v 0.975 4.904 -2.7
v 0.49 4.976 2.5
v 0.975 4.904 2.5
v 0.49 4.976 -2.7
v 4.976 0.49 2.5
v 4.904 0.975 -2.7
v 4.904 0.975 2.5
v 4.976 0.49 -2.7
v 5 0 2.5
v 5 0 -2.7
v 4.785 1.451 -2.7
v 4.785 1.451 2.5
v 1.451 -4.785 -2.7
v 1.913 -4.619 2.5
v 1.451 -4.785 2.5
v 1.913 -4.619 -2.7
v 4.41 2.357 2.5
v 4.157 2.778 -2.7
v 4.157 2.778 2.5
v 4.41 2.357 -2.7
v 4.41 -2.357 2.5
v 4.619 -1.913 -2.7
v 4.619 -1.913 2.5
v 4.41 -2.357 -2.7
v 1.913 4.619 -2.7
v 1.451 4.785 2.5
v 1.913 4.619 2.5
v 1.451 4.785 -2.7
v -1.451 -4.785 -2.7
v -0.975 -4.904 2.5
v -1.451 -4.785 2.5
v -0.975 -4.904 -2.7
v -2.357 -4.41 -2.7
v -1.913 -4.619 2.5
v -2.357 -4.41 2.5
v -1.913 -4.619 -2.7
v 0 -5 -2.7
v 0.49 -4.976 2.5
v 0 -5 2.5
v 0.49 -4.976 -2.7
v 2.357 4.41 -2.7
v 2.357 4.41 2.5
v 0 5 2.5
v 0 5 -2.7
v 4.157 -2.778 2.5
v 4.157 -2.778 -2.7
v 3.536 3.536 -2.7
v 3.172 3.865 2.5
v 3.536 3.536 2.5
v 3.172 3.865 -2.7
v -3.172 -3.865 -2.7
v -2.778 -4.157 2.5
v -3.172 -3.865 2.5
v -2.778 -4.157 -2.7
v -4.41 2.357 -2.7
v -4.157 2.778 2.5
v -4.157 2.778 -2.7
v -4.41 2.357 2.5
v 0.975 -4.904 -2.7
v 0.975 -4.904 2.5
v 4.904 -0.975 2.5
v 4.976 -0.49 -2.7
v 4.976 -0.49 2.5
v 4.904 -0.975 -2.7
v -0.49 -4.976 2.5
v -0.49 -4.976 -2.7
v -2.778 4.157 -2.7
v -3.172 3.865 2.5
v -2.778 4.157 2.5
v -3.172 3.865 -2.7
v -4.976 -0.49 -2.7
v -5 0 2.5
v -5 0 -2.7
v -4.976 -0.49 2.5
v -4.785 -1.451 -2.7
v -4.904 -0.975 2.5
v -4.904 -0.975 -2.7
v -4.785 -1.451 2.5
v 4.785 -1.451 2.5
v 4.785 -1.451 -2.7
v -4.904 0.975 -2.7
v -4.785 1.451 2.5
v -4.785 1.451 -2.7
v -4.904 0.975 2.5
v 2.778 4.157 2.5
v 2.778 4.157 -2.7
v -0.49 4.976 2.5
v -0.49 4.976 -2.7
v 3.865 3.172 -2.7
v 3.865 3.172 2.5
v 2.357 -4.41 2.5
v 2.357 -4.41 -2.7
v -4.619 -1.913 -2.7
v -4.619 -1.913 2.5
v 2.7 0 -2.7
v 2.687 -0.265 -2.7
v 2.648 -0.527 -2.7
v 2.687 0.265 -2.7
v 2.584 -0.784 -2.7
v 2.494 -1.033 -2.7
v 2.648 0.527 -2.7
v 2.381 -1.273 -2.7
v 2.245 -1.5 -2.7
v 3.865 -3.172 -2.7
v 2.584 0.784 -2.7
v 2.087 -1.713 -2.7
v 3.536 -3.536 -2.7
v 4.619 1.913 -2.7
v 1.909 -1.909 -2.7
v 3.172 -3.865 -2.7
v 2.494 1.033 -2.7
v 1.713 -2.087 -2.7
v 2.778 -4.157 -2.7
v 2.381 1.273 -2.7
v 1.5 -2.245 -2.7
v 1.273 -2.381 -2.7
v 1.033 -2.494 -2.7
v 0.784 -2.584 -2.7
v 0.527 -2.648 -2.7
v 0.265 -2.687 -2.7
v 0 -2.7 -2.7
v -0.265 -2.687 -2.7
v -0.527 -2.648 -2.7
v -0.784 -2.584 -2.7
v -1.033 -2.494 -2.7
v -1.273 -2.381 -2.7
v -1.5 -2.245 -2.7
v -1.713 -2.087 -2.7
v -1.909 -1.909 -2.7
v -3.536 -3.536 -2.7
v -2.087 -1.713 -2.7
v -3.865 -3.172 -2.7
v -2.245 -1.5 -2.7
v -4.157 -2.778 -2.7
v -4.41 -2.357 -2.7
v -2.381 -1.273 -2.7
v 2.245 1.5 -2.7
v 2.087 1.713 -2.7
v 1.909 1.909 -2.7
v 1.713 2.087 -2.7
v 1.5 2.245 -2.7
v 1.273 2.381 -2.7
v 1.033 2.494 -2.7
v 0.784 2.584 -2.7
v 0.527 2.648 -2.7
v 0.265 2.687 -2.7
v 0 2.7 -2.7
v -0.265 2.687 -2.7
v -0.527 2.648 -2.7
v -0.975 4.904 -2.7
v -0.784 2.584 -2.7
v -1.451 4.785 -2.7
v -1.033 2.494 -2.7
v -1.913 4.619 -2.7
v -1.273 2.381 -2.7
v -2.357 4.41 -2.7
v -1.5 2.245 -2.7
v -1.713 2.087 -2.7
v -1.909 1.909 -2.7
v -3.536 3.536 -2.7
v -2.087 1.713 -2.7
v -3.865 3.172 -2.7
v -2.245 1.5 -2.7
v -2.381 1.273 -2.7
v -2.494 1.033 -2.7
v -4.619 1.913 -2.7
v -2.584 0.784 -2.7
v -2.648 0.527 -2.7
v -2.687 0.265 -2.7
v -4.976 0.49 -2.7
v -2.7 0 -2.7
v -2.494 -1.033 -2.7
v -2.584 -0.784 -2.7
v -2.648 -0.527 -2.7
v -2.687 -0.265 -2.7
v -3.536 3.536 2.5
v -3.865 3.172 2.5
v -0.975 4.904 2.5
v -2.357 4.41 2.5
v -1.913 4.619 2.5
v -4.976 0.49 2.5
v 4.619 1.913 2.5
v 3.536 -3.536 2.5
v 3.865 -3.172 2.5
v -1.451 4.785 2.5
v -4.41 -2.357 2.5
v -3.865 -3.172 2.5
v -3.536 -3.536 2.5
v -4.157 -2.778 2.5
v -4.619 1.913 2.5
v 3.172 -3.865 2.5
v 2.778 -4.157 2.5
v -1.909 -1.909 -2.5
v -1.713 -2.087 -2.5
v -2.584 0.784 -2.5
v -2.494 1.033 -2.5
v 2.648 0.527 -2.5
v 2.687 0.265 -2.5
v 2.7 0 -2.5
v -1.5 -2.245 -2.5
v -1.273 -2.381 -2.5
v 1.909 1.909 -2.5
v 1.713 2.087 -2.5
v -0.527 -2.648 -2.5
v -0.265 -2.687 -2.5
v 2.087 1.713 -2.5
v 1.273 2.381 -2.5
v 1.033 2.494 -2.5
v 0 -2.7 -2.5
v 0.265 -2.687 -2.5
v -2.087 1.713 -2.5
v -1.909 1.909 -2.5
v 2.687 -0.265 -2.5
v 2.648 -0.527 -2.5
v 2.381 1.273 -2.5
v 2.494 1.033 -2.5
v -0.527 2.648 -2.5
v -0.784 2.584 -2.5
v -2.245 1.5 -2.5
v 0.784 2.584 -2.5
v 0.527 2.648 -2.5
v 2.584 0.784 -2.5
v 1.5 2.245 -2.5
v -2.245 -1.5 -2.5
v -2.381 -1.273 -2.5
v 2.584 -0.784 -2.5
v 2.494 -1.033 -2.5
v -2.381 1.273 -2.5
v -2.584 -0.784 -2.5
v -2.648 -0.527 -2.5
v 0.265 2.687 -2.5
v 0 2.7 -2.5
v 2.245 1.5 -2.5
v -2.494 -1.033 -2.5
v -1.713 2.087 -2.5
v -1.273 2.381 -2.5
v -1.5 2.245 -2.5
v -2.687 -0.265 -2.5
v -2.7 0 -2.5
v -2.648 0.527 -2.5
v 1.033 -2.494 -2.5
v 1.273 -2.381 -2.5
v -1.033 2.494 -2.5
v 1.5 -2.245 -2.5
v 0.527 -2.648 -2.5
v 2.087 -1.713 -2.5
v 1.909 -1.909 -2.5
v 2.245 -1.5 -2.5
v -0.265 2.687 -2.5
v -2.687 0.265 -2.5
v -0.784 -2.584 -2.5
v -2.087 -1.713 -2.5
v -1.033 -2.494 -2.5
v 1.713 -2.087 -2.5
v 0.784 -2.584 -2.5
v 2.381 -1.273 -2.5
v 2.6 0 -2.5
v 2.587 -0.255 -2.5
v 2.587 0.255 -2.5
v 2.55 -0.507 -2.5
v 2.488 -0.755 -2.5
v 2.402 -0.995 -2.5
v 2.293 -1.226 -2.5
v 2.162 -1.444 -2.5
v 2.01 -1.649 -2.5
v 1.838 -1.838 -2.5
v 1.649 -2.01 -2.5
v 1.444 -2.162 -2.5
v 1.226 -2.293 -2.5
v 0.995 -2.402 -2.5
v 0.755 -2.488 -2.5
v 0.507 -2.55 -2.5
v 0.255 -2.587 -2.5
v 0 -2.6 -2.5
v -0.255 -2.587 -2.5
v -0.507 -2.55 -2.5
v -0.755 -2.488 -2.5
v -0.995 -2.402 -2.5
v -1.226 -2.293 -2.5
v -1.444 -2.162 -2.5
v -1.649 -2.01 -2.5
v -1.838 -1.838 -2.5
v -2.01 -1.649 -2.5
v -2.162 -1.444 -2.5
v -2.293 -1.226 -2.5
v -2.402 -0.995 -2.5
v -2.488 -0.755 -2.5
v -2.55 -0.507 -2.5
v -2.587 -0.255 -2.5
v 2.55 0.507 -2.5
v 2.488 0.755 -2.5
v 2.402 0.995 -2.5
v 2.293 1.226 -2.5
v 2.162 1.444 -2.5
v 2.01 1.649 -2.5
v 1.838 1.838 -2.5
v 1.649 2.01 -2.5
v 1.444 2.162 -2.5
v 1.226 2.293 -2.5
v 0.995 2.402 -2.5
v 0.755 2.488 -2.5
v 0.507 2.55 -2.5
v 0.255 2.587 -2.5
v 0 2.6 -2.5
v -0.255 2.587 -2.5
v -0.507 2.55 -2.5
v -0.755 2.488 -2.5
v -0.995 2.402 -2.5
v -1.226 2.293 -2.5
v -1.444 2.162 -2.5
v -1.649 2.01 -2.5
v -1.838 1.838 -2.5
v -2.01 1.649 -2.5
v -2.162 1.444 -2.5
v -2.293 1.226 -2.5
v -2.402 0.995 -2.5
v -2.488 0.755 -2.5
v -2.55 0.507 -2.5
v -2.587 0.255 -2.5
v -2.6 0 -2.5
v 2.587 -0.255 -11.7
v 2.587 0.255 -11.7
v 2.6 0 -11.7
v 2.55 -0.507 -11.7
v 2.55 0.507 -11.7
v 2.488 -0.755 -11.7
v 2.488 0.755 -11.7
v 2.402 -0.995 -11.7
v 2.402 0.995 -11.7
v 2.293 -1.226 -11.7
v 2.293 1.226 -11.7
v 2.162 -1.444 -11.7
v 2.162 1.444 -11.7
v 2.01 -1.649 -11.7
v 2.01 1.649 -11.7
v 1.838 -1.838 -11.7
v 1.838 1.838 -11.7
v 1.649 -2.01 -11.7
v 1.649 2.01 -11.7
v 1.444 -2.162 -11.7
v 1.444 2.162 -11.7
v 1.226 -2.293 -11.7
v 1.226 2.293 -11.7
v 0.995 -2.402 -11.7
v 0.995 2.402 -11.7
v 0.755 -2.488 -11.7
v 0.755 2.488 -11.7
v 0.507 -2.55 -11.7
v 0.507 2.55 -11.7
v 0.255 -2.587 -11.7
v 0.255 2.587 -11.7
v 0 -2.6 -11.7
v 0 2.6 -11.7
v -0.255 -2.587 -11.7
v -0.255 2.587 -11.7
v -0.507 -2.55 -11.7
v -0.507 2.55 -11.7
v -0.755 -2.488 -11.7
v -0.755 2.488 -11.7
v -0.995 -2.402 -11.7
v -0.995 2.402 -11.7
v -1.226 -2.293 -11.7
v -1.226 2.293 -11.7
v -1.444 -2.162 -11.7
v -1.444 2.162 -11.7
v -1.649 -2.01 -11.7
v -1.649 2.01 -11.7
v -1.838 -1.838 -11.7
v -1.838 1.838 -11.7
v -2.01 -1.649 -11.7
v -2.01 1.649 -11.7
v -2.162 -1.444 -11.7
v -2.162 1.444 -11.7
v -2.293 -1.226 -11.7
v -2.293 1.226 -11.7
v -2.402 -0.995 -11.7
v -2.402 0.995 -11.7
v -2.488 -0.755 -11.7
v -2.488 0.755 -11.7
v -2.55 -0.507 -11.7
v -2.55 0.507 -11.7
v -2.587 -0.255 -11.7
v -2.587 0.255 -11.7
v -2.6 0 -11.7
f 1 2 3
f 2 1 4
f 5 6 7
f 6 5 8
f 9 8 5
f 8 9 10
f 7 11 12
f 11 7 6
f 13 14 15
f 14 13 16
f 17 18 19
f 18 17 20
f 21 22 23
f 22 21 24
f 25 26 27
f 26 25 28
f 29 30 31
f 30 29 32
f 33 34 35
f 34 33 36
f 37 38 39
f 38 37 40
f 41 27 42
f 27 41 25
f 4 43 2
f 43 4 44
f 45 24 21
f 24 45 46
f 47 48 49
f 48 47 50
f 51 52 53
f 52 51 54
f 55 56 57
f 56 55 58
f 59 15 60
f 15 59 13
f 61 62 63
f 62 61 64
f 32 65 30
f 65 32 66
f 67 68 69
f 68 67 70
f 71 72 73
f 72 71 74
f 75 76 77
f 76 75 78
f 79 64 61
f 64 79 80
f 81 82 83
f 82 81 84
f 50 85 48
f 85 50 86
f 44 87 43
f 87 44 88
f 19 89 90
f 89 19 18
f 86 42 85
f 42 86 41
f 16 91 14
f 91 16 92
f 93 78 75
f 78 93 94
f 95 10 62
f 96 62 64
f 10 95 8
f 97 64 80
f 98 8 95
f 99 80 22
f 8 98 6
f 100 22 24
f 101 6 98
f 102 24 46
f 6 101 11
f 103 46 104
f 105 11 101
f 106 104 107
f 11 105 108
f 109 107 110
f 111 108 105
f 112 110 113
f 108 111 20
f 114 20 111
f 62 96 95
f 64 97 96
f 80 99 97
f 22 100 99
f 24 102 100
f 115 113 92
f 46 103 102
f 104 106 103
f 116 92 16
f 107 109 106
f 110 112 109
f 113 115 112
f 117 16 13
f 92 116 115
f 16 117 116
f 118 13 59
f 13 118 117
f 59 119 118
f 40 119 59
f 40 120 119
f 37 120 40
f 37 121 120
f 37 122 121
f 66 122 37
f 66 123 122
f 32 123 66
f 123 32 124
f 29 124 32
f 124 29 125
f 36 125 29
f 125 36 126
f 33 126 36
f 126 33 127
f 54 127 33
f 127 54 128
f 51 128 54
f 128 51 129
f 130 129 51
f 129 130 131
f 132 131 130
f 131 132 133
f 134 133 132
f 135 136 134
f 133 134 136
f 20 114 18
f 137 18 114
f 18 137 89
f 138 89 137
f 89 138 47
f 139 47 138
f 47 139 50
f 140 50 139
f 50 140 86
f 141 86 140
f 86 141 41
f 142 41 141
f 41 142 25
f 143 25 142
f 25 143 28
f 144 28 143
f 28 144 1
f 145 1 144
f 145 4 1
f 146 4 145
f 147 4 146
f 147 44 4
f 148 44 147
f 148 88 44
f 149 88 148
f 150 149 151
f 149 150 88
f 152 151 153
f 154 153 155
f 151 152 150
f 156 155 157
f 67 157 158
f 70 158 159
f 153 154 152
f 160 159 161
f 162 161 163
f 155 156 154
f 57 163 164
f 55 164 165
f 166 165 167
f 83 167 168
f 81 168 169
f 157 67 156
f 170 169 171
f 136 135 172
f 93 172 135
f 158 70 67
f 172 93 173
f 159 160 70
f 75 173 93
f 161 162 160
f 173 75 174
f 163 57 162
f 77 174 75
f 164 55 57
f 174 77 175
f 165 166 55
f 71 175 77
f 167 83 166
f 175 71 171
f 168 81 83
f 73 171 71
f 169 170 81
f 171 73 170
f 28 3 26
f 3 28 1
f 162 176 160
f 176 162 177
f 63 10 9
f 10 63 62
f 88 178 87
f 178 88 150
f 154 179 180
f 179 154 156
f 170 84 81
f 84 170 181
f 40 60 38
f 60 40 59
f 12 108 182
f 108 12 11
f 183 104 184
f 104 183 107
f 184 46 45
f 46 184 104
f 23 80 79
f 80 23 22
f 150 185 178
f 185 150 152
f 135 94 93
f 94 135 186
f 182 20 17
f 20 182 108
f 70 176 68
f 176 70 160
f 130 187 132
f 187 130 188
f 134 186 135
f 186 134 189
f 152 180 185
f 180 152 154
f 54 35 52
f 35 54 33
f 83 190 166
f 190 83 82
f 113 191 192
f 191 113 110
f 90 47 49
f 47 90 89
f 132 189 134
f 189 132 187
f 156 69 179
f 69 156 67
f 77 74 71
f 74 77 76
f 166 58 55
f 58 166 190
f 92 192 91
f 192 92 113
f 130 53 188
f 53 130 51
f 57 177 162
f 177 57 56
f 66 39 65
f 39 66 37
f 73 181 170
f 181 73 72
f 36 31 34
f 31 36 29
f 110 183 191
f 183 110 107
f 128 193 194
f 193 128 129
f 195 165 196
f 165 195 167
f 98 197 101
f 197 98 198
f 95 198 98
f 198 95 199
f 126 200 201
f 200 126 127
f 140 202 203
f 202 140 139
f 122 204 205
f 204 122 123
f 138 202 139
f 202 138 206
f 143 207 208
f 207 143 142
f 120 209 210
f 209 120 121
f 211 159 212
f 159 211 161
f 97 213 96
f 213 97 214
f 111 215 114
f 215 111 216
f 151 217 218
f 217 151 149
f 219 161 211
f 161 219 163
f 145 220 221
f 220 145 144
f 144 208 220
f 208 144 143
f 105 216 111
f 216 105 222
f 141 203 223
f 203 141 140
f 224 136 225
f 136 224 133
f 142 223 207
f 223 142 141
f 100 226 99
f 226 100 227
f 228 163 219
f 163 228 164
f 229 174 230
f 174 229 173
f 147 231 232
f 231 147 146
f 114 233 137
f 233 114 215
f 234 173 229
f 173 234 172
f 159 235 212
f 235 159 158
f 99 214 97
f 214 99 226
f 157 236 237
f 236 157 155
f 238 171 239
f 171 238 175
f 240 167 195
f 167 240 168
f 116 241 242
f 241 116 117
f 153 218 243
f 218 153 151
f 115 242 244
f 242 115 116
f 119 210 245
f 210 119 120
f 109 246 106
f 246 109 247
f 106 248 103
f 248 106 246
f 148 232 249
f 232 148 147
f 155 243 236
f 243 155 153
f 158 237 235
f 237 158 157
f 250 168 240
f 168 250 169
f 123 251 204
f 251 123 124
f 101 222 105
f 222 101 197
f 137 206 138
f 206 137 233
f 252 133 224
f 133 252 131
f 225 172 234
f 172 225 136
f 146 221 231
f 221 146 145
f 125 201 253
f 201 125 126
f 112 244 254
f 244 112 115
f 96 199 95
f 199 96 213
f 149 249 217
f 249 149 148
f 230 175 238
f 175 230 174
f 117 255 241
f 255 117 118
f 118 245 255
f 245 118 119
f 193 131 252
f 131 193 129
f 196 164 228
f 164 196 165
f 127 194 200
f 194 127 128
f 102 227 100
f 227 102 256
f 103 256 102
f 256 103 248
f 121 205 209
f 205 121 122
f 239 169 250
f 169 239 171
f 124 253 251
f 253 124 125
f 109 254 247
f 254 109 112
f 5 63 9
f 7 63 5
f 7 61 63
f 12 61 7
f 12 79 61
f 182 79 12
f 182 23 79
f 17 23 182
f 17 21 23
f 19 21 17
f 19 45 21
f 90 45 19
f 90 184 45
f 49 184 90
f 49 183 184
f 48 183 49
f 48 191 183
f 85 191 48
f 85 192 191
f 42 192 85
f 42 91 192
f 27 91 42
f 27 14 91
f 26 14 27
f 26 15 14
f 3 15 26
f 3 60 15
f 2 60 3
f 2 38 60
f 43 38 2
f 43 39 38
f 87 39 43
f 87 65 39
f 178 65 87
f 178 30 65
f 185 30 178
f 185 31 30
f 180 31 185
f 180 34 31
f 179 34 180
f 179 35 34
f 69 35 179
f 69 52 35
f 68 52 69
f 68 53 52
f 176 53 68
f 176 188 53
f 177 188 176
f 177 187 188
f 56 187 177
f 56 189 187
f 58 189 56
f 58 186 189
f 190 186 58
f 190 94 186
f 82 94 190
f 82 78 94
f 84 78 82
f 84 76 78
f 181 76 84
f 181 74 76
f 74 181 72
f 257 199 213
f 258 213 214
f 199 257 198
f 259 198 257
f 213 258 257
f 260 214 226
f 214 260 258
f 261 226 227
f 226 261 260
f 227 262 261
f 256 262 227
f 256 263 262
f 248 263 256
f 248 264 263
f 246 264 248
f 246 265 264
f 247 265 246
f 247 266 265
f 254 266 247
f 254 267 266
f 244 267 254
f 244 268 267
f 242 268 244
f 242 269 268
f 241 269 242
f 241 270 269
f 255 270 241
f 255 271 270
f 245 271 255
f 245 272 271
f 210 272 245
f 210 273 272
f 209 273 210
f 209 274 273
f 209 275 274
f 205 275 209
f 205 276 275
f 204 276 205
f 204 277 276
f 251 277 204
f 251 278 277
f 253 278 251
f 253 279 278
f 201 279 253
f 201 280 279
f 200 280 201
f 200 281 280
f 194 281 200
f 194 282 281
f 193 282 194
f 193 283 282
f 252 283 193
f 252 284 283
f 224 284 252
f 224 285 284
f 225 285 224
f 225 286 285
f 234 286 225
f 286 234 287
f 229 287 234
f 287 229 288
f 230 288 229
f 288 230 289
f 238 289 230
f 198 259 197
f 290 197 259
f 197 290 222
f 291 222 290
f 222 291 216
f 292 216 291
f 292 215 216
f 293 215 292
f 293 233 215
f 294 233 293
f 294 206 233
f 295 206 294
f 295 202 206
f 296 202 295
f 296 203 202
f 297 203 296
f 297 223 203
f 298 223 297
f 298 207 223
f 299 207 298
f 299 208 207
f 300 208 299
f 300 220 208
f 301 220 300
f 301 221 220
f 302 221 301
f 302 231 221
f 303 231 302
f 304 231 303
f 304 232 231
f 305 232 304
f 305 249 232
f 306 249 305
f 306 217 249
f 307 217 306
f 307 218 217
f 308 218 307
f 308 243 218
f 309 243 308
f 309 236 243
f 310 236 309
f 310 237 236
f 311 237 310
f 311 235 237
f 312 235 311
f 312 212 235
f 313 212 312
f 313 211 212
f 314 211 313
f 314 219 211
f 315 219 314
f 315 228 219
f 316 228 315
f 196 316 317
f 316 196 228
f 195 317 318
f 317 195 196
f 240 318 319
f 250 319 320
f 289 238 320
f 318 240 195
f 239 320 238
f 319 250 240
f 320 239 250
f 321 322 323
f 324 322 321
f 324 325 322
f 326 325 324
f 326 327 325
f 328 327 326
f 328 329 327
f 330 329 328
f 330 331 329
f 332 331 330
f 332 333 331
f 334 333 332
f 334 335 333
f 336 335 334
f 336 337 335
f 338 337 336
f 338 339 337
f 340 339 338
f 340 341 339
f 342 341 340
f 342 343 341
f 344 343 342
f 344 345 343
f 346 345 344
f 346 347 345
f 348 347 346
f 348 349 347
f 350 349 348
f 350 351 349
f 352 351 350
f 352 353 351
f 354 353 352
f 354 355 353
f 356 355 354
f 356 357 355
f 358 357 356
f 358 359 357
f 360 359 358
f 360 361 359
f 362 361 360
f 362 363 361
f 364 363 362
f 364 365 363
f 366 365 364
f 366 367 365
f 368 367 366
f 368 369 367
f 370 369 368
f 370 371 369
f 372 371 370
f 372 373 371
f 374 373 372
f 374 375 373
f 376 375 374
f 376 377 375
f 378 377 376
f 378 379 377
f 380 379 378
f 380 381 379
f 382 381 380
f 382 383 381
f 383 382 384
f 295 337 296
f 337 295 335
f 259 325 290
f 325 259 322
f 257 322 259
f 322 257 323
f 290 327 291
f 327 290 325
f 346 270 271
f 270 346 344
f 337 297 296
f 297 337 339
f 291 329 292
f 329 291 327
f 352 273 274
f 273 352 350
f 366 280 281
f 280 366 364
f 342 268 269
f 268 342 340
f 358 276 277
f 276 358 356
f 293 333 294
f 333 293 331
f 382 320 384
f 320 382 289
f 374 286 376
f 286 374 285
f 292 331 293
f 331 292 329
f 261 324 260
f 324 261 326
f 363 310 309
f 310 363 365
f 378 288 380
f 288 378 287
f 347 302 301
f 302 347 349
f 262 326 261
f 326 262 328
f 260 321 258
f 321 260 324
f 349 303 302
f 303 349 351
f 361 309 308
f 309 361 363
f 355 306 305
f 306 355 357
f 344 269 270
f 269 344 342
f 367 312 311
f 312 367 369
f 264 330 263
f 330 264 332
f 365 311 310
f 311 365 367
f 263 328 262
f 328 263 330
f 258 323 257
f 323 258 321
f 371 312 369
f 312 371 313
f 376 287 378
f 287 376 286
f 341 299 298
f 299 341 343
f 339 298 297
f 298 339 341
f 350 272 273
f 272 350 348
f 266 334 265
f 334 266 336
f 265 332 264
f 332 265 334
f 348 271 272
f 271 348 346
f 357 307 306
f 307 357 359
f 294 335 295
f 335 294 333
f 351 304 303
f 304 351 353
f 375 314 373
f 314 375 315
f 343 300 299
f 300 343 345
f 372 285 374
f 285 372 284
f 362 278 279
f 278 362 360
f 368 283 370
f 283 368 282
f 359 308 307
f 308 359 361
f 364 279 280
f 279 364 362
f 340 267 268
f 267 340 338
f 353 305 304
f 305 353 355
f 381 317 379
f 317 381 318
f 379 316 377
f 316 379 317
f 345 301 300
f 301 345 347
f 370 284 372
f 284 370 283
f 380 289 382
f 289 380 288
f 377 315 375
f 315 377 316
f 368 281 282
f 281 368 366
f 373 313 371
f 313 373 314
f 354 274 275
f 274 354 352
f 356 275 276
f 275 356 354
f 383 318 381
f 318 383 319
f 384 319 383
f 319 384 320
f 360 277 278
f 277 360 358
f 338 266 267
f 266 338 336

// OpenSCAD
// Parameters
shank_diameter_mm = 5; //[2.5:10:0.1]
length_under_head_mm = 10; //[5:20:0.5]
head_diameter_mm = 10; //[6:20:0.5]
head_height_mm = 5; //[2.5:10:0.25]
socket_across_flats_mm = 4; //[2:8:0.1]
socket_depth_mm = 3; //[1.5:6:0.1]
thread_length_mm = 10; //[5:20:0.5]
thread_major_diameter_mm = 5.2; //[4.8:6.5:0.05]
washer_enabled = 1; //[0:1:1]
washer_outer_diameter_mm = 10; //[6:20:0.5]
washer_thickness_mm = 1; //[0.5:3:0.1]
clearance_mm = 0.2; //[0.05:0.5:0.05]
overlap_mm = 0.8; //[0.5:2:0.1]

// Screw and Washer - Complete detailed geometry
module screw_and_washer() {
  color("DimGray") {
    // Cap Head
    translate([0, 0, 0])
      cylinder(r=head_diameter_mm/2, h=head_height_mm, center=true, $fn=64);

    // Screw Body
    translate([0, 0, -head_height_mm/2 - length_under_head_mm/2 + overlap_mm])
      cylinder(r=shank_diameter_mm/2, h=length_under_head_mm, center=true, $fn=64);

    // Threaded Shank
    translate([0, 0, -head_height_mm/2 - thread_length_mm/2 + overlap_mm])
      cylinder(r=thread_major_diameter_mm/2, h=thread_length_mm, center=true, $fn=64);

    // Washer
    if (washer_enabled) {
      difference() {
        translate([0, 0, -head_height_mm/2 - washer_thickness_mm/2 + overlap_mm])
          cylinder(r=washer_outer_diameter_mm/2, h=washer_thickness_mm, center=true, $fn=64);
        translate([0, 0, -head_height_mm/2 - washer_thickness_mm/2 + overlap_mm])
          cylinder(r=shank_diameter_mm/2 + clearance_mm, h=washer_thickness_mm + overlap_mm*2, center=true, $fn=64);
      }
    }

    // Hex Socket
    difference() {
      translate([0, 0, head_height_mm/2 - (socket_depth_mm + overlap_mm)/2])
        cylinder(r=(socket_across_flats_mm + clearance_mm)/cos(30)/2, h=socket_depth_mm + overlap_mm, center=true, $fn=6);
    }
  }
}

// Assembly
module assembly() {
  screw_and_washer();
}

assembly();
